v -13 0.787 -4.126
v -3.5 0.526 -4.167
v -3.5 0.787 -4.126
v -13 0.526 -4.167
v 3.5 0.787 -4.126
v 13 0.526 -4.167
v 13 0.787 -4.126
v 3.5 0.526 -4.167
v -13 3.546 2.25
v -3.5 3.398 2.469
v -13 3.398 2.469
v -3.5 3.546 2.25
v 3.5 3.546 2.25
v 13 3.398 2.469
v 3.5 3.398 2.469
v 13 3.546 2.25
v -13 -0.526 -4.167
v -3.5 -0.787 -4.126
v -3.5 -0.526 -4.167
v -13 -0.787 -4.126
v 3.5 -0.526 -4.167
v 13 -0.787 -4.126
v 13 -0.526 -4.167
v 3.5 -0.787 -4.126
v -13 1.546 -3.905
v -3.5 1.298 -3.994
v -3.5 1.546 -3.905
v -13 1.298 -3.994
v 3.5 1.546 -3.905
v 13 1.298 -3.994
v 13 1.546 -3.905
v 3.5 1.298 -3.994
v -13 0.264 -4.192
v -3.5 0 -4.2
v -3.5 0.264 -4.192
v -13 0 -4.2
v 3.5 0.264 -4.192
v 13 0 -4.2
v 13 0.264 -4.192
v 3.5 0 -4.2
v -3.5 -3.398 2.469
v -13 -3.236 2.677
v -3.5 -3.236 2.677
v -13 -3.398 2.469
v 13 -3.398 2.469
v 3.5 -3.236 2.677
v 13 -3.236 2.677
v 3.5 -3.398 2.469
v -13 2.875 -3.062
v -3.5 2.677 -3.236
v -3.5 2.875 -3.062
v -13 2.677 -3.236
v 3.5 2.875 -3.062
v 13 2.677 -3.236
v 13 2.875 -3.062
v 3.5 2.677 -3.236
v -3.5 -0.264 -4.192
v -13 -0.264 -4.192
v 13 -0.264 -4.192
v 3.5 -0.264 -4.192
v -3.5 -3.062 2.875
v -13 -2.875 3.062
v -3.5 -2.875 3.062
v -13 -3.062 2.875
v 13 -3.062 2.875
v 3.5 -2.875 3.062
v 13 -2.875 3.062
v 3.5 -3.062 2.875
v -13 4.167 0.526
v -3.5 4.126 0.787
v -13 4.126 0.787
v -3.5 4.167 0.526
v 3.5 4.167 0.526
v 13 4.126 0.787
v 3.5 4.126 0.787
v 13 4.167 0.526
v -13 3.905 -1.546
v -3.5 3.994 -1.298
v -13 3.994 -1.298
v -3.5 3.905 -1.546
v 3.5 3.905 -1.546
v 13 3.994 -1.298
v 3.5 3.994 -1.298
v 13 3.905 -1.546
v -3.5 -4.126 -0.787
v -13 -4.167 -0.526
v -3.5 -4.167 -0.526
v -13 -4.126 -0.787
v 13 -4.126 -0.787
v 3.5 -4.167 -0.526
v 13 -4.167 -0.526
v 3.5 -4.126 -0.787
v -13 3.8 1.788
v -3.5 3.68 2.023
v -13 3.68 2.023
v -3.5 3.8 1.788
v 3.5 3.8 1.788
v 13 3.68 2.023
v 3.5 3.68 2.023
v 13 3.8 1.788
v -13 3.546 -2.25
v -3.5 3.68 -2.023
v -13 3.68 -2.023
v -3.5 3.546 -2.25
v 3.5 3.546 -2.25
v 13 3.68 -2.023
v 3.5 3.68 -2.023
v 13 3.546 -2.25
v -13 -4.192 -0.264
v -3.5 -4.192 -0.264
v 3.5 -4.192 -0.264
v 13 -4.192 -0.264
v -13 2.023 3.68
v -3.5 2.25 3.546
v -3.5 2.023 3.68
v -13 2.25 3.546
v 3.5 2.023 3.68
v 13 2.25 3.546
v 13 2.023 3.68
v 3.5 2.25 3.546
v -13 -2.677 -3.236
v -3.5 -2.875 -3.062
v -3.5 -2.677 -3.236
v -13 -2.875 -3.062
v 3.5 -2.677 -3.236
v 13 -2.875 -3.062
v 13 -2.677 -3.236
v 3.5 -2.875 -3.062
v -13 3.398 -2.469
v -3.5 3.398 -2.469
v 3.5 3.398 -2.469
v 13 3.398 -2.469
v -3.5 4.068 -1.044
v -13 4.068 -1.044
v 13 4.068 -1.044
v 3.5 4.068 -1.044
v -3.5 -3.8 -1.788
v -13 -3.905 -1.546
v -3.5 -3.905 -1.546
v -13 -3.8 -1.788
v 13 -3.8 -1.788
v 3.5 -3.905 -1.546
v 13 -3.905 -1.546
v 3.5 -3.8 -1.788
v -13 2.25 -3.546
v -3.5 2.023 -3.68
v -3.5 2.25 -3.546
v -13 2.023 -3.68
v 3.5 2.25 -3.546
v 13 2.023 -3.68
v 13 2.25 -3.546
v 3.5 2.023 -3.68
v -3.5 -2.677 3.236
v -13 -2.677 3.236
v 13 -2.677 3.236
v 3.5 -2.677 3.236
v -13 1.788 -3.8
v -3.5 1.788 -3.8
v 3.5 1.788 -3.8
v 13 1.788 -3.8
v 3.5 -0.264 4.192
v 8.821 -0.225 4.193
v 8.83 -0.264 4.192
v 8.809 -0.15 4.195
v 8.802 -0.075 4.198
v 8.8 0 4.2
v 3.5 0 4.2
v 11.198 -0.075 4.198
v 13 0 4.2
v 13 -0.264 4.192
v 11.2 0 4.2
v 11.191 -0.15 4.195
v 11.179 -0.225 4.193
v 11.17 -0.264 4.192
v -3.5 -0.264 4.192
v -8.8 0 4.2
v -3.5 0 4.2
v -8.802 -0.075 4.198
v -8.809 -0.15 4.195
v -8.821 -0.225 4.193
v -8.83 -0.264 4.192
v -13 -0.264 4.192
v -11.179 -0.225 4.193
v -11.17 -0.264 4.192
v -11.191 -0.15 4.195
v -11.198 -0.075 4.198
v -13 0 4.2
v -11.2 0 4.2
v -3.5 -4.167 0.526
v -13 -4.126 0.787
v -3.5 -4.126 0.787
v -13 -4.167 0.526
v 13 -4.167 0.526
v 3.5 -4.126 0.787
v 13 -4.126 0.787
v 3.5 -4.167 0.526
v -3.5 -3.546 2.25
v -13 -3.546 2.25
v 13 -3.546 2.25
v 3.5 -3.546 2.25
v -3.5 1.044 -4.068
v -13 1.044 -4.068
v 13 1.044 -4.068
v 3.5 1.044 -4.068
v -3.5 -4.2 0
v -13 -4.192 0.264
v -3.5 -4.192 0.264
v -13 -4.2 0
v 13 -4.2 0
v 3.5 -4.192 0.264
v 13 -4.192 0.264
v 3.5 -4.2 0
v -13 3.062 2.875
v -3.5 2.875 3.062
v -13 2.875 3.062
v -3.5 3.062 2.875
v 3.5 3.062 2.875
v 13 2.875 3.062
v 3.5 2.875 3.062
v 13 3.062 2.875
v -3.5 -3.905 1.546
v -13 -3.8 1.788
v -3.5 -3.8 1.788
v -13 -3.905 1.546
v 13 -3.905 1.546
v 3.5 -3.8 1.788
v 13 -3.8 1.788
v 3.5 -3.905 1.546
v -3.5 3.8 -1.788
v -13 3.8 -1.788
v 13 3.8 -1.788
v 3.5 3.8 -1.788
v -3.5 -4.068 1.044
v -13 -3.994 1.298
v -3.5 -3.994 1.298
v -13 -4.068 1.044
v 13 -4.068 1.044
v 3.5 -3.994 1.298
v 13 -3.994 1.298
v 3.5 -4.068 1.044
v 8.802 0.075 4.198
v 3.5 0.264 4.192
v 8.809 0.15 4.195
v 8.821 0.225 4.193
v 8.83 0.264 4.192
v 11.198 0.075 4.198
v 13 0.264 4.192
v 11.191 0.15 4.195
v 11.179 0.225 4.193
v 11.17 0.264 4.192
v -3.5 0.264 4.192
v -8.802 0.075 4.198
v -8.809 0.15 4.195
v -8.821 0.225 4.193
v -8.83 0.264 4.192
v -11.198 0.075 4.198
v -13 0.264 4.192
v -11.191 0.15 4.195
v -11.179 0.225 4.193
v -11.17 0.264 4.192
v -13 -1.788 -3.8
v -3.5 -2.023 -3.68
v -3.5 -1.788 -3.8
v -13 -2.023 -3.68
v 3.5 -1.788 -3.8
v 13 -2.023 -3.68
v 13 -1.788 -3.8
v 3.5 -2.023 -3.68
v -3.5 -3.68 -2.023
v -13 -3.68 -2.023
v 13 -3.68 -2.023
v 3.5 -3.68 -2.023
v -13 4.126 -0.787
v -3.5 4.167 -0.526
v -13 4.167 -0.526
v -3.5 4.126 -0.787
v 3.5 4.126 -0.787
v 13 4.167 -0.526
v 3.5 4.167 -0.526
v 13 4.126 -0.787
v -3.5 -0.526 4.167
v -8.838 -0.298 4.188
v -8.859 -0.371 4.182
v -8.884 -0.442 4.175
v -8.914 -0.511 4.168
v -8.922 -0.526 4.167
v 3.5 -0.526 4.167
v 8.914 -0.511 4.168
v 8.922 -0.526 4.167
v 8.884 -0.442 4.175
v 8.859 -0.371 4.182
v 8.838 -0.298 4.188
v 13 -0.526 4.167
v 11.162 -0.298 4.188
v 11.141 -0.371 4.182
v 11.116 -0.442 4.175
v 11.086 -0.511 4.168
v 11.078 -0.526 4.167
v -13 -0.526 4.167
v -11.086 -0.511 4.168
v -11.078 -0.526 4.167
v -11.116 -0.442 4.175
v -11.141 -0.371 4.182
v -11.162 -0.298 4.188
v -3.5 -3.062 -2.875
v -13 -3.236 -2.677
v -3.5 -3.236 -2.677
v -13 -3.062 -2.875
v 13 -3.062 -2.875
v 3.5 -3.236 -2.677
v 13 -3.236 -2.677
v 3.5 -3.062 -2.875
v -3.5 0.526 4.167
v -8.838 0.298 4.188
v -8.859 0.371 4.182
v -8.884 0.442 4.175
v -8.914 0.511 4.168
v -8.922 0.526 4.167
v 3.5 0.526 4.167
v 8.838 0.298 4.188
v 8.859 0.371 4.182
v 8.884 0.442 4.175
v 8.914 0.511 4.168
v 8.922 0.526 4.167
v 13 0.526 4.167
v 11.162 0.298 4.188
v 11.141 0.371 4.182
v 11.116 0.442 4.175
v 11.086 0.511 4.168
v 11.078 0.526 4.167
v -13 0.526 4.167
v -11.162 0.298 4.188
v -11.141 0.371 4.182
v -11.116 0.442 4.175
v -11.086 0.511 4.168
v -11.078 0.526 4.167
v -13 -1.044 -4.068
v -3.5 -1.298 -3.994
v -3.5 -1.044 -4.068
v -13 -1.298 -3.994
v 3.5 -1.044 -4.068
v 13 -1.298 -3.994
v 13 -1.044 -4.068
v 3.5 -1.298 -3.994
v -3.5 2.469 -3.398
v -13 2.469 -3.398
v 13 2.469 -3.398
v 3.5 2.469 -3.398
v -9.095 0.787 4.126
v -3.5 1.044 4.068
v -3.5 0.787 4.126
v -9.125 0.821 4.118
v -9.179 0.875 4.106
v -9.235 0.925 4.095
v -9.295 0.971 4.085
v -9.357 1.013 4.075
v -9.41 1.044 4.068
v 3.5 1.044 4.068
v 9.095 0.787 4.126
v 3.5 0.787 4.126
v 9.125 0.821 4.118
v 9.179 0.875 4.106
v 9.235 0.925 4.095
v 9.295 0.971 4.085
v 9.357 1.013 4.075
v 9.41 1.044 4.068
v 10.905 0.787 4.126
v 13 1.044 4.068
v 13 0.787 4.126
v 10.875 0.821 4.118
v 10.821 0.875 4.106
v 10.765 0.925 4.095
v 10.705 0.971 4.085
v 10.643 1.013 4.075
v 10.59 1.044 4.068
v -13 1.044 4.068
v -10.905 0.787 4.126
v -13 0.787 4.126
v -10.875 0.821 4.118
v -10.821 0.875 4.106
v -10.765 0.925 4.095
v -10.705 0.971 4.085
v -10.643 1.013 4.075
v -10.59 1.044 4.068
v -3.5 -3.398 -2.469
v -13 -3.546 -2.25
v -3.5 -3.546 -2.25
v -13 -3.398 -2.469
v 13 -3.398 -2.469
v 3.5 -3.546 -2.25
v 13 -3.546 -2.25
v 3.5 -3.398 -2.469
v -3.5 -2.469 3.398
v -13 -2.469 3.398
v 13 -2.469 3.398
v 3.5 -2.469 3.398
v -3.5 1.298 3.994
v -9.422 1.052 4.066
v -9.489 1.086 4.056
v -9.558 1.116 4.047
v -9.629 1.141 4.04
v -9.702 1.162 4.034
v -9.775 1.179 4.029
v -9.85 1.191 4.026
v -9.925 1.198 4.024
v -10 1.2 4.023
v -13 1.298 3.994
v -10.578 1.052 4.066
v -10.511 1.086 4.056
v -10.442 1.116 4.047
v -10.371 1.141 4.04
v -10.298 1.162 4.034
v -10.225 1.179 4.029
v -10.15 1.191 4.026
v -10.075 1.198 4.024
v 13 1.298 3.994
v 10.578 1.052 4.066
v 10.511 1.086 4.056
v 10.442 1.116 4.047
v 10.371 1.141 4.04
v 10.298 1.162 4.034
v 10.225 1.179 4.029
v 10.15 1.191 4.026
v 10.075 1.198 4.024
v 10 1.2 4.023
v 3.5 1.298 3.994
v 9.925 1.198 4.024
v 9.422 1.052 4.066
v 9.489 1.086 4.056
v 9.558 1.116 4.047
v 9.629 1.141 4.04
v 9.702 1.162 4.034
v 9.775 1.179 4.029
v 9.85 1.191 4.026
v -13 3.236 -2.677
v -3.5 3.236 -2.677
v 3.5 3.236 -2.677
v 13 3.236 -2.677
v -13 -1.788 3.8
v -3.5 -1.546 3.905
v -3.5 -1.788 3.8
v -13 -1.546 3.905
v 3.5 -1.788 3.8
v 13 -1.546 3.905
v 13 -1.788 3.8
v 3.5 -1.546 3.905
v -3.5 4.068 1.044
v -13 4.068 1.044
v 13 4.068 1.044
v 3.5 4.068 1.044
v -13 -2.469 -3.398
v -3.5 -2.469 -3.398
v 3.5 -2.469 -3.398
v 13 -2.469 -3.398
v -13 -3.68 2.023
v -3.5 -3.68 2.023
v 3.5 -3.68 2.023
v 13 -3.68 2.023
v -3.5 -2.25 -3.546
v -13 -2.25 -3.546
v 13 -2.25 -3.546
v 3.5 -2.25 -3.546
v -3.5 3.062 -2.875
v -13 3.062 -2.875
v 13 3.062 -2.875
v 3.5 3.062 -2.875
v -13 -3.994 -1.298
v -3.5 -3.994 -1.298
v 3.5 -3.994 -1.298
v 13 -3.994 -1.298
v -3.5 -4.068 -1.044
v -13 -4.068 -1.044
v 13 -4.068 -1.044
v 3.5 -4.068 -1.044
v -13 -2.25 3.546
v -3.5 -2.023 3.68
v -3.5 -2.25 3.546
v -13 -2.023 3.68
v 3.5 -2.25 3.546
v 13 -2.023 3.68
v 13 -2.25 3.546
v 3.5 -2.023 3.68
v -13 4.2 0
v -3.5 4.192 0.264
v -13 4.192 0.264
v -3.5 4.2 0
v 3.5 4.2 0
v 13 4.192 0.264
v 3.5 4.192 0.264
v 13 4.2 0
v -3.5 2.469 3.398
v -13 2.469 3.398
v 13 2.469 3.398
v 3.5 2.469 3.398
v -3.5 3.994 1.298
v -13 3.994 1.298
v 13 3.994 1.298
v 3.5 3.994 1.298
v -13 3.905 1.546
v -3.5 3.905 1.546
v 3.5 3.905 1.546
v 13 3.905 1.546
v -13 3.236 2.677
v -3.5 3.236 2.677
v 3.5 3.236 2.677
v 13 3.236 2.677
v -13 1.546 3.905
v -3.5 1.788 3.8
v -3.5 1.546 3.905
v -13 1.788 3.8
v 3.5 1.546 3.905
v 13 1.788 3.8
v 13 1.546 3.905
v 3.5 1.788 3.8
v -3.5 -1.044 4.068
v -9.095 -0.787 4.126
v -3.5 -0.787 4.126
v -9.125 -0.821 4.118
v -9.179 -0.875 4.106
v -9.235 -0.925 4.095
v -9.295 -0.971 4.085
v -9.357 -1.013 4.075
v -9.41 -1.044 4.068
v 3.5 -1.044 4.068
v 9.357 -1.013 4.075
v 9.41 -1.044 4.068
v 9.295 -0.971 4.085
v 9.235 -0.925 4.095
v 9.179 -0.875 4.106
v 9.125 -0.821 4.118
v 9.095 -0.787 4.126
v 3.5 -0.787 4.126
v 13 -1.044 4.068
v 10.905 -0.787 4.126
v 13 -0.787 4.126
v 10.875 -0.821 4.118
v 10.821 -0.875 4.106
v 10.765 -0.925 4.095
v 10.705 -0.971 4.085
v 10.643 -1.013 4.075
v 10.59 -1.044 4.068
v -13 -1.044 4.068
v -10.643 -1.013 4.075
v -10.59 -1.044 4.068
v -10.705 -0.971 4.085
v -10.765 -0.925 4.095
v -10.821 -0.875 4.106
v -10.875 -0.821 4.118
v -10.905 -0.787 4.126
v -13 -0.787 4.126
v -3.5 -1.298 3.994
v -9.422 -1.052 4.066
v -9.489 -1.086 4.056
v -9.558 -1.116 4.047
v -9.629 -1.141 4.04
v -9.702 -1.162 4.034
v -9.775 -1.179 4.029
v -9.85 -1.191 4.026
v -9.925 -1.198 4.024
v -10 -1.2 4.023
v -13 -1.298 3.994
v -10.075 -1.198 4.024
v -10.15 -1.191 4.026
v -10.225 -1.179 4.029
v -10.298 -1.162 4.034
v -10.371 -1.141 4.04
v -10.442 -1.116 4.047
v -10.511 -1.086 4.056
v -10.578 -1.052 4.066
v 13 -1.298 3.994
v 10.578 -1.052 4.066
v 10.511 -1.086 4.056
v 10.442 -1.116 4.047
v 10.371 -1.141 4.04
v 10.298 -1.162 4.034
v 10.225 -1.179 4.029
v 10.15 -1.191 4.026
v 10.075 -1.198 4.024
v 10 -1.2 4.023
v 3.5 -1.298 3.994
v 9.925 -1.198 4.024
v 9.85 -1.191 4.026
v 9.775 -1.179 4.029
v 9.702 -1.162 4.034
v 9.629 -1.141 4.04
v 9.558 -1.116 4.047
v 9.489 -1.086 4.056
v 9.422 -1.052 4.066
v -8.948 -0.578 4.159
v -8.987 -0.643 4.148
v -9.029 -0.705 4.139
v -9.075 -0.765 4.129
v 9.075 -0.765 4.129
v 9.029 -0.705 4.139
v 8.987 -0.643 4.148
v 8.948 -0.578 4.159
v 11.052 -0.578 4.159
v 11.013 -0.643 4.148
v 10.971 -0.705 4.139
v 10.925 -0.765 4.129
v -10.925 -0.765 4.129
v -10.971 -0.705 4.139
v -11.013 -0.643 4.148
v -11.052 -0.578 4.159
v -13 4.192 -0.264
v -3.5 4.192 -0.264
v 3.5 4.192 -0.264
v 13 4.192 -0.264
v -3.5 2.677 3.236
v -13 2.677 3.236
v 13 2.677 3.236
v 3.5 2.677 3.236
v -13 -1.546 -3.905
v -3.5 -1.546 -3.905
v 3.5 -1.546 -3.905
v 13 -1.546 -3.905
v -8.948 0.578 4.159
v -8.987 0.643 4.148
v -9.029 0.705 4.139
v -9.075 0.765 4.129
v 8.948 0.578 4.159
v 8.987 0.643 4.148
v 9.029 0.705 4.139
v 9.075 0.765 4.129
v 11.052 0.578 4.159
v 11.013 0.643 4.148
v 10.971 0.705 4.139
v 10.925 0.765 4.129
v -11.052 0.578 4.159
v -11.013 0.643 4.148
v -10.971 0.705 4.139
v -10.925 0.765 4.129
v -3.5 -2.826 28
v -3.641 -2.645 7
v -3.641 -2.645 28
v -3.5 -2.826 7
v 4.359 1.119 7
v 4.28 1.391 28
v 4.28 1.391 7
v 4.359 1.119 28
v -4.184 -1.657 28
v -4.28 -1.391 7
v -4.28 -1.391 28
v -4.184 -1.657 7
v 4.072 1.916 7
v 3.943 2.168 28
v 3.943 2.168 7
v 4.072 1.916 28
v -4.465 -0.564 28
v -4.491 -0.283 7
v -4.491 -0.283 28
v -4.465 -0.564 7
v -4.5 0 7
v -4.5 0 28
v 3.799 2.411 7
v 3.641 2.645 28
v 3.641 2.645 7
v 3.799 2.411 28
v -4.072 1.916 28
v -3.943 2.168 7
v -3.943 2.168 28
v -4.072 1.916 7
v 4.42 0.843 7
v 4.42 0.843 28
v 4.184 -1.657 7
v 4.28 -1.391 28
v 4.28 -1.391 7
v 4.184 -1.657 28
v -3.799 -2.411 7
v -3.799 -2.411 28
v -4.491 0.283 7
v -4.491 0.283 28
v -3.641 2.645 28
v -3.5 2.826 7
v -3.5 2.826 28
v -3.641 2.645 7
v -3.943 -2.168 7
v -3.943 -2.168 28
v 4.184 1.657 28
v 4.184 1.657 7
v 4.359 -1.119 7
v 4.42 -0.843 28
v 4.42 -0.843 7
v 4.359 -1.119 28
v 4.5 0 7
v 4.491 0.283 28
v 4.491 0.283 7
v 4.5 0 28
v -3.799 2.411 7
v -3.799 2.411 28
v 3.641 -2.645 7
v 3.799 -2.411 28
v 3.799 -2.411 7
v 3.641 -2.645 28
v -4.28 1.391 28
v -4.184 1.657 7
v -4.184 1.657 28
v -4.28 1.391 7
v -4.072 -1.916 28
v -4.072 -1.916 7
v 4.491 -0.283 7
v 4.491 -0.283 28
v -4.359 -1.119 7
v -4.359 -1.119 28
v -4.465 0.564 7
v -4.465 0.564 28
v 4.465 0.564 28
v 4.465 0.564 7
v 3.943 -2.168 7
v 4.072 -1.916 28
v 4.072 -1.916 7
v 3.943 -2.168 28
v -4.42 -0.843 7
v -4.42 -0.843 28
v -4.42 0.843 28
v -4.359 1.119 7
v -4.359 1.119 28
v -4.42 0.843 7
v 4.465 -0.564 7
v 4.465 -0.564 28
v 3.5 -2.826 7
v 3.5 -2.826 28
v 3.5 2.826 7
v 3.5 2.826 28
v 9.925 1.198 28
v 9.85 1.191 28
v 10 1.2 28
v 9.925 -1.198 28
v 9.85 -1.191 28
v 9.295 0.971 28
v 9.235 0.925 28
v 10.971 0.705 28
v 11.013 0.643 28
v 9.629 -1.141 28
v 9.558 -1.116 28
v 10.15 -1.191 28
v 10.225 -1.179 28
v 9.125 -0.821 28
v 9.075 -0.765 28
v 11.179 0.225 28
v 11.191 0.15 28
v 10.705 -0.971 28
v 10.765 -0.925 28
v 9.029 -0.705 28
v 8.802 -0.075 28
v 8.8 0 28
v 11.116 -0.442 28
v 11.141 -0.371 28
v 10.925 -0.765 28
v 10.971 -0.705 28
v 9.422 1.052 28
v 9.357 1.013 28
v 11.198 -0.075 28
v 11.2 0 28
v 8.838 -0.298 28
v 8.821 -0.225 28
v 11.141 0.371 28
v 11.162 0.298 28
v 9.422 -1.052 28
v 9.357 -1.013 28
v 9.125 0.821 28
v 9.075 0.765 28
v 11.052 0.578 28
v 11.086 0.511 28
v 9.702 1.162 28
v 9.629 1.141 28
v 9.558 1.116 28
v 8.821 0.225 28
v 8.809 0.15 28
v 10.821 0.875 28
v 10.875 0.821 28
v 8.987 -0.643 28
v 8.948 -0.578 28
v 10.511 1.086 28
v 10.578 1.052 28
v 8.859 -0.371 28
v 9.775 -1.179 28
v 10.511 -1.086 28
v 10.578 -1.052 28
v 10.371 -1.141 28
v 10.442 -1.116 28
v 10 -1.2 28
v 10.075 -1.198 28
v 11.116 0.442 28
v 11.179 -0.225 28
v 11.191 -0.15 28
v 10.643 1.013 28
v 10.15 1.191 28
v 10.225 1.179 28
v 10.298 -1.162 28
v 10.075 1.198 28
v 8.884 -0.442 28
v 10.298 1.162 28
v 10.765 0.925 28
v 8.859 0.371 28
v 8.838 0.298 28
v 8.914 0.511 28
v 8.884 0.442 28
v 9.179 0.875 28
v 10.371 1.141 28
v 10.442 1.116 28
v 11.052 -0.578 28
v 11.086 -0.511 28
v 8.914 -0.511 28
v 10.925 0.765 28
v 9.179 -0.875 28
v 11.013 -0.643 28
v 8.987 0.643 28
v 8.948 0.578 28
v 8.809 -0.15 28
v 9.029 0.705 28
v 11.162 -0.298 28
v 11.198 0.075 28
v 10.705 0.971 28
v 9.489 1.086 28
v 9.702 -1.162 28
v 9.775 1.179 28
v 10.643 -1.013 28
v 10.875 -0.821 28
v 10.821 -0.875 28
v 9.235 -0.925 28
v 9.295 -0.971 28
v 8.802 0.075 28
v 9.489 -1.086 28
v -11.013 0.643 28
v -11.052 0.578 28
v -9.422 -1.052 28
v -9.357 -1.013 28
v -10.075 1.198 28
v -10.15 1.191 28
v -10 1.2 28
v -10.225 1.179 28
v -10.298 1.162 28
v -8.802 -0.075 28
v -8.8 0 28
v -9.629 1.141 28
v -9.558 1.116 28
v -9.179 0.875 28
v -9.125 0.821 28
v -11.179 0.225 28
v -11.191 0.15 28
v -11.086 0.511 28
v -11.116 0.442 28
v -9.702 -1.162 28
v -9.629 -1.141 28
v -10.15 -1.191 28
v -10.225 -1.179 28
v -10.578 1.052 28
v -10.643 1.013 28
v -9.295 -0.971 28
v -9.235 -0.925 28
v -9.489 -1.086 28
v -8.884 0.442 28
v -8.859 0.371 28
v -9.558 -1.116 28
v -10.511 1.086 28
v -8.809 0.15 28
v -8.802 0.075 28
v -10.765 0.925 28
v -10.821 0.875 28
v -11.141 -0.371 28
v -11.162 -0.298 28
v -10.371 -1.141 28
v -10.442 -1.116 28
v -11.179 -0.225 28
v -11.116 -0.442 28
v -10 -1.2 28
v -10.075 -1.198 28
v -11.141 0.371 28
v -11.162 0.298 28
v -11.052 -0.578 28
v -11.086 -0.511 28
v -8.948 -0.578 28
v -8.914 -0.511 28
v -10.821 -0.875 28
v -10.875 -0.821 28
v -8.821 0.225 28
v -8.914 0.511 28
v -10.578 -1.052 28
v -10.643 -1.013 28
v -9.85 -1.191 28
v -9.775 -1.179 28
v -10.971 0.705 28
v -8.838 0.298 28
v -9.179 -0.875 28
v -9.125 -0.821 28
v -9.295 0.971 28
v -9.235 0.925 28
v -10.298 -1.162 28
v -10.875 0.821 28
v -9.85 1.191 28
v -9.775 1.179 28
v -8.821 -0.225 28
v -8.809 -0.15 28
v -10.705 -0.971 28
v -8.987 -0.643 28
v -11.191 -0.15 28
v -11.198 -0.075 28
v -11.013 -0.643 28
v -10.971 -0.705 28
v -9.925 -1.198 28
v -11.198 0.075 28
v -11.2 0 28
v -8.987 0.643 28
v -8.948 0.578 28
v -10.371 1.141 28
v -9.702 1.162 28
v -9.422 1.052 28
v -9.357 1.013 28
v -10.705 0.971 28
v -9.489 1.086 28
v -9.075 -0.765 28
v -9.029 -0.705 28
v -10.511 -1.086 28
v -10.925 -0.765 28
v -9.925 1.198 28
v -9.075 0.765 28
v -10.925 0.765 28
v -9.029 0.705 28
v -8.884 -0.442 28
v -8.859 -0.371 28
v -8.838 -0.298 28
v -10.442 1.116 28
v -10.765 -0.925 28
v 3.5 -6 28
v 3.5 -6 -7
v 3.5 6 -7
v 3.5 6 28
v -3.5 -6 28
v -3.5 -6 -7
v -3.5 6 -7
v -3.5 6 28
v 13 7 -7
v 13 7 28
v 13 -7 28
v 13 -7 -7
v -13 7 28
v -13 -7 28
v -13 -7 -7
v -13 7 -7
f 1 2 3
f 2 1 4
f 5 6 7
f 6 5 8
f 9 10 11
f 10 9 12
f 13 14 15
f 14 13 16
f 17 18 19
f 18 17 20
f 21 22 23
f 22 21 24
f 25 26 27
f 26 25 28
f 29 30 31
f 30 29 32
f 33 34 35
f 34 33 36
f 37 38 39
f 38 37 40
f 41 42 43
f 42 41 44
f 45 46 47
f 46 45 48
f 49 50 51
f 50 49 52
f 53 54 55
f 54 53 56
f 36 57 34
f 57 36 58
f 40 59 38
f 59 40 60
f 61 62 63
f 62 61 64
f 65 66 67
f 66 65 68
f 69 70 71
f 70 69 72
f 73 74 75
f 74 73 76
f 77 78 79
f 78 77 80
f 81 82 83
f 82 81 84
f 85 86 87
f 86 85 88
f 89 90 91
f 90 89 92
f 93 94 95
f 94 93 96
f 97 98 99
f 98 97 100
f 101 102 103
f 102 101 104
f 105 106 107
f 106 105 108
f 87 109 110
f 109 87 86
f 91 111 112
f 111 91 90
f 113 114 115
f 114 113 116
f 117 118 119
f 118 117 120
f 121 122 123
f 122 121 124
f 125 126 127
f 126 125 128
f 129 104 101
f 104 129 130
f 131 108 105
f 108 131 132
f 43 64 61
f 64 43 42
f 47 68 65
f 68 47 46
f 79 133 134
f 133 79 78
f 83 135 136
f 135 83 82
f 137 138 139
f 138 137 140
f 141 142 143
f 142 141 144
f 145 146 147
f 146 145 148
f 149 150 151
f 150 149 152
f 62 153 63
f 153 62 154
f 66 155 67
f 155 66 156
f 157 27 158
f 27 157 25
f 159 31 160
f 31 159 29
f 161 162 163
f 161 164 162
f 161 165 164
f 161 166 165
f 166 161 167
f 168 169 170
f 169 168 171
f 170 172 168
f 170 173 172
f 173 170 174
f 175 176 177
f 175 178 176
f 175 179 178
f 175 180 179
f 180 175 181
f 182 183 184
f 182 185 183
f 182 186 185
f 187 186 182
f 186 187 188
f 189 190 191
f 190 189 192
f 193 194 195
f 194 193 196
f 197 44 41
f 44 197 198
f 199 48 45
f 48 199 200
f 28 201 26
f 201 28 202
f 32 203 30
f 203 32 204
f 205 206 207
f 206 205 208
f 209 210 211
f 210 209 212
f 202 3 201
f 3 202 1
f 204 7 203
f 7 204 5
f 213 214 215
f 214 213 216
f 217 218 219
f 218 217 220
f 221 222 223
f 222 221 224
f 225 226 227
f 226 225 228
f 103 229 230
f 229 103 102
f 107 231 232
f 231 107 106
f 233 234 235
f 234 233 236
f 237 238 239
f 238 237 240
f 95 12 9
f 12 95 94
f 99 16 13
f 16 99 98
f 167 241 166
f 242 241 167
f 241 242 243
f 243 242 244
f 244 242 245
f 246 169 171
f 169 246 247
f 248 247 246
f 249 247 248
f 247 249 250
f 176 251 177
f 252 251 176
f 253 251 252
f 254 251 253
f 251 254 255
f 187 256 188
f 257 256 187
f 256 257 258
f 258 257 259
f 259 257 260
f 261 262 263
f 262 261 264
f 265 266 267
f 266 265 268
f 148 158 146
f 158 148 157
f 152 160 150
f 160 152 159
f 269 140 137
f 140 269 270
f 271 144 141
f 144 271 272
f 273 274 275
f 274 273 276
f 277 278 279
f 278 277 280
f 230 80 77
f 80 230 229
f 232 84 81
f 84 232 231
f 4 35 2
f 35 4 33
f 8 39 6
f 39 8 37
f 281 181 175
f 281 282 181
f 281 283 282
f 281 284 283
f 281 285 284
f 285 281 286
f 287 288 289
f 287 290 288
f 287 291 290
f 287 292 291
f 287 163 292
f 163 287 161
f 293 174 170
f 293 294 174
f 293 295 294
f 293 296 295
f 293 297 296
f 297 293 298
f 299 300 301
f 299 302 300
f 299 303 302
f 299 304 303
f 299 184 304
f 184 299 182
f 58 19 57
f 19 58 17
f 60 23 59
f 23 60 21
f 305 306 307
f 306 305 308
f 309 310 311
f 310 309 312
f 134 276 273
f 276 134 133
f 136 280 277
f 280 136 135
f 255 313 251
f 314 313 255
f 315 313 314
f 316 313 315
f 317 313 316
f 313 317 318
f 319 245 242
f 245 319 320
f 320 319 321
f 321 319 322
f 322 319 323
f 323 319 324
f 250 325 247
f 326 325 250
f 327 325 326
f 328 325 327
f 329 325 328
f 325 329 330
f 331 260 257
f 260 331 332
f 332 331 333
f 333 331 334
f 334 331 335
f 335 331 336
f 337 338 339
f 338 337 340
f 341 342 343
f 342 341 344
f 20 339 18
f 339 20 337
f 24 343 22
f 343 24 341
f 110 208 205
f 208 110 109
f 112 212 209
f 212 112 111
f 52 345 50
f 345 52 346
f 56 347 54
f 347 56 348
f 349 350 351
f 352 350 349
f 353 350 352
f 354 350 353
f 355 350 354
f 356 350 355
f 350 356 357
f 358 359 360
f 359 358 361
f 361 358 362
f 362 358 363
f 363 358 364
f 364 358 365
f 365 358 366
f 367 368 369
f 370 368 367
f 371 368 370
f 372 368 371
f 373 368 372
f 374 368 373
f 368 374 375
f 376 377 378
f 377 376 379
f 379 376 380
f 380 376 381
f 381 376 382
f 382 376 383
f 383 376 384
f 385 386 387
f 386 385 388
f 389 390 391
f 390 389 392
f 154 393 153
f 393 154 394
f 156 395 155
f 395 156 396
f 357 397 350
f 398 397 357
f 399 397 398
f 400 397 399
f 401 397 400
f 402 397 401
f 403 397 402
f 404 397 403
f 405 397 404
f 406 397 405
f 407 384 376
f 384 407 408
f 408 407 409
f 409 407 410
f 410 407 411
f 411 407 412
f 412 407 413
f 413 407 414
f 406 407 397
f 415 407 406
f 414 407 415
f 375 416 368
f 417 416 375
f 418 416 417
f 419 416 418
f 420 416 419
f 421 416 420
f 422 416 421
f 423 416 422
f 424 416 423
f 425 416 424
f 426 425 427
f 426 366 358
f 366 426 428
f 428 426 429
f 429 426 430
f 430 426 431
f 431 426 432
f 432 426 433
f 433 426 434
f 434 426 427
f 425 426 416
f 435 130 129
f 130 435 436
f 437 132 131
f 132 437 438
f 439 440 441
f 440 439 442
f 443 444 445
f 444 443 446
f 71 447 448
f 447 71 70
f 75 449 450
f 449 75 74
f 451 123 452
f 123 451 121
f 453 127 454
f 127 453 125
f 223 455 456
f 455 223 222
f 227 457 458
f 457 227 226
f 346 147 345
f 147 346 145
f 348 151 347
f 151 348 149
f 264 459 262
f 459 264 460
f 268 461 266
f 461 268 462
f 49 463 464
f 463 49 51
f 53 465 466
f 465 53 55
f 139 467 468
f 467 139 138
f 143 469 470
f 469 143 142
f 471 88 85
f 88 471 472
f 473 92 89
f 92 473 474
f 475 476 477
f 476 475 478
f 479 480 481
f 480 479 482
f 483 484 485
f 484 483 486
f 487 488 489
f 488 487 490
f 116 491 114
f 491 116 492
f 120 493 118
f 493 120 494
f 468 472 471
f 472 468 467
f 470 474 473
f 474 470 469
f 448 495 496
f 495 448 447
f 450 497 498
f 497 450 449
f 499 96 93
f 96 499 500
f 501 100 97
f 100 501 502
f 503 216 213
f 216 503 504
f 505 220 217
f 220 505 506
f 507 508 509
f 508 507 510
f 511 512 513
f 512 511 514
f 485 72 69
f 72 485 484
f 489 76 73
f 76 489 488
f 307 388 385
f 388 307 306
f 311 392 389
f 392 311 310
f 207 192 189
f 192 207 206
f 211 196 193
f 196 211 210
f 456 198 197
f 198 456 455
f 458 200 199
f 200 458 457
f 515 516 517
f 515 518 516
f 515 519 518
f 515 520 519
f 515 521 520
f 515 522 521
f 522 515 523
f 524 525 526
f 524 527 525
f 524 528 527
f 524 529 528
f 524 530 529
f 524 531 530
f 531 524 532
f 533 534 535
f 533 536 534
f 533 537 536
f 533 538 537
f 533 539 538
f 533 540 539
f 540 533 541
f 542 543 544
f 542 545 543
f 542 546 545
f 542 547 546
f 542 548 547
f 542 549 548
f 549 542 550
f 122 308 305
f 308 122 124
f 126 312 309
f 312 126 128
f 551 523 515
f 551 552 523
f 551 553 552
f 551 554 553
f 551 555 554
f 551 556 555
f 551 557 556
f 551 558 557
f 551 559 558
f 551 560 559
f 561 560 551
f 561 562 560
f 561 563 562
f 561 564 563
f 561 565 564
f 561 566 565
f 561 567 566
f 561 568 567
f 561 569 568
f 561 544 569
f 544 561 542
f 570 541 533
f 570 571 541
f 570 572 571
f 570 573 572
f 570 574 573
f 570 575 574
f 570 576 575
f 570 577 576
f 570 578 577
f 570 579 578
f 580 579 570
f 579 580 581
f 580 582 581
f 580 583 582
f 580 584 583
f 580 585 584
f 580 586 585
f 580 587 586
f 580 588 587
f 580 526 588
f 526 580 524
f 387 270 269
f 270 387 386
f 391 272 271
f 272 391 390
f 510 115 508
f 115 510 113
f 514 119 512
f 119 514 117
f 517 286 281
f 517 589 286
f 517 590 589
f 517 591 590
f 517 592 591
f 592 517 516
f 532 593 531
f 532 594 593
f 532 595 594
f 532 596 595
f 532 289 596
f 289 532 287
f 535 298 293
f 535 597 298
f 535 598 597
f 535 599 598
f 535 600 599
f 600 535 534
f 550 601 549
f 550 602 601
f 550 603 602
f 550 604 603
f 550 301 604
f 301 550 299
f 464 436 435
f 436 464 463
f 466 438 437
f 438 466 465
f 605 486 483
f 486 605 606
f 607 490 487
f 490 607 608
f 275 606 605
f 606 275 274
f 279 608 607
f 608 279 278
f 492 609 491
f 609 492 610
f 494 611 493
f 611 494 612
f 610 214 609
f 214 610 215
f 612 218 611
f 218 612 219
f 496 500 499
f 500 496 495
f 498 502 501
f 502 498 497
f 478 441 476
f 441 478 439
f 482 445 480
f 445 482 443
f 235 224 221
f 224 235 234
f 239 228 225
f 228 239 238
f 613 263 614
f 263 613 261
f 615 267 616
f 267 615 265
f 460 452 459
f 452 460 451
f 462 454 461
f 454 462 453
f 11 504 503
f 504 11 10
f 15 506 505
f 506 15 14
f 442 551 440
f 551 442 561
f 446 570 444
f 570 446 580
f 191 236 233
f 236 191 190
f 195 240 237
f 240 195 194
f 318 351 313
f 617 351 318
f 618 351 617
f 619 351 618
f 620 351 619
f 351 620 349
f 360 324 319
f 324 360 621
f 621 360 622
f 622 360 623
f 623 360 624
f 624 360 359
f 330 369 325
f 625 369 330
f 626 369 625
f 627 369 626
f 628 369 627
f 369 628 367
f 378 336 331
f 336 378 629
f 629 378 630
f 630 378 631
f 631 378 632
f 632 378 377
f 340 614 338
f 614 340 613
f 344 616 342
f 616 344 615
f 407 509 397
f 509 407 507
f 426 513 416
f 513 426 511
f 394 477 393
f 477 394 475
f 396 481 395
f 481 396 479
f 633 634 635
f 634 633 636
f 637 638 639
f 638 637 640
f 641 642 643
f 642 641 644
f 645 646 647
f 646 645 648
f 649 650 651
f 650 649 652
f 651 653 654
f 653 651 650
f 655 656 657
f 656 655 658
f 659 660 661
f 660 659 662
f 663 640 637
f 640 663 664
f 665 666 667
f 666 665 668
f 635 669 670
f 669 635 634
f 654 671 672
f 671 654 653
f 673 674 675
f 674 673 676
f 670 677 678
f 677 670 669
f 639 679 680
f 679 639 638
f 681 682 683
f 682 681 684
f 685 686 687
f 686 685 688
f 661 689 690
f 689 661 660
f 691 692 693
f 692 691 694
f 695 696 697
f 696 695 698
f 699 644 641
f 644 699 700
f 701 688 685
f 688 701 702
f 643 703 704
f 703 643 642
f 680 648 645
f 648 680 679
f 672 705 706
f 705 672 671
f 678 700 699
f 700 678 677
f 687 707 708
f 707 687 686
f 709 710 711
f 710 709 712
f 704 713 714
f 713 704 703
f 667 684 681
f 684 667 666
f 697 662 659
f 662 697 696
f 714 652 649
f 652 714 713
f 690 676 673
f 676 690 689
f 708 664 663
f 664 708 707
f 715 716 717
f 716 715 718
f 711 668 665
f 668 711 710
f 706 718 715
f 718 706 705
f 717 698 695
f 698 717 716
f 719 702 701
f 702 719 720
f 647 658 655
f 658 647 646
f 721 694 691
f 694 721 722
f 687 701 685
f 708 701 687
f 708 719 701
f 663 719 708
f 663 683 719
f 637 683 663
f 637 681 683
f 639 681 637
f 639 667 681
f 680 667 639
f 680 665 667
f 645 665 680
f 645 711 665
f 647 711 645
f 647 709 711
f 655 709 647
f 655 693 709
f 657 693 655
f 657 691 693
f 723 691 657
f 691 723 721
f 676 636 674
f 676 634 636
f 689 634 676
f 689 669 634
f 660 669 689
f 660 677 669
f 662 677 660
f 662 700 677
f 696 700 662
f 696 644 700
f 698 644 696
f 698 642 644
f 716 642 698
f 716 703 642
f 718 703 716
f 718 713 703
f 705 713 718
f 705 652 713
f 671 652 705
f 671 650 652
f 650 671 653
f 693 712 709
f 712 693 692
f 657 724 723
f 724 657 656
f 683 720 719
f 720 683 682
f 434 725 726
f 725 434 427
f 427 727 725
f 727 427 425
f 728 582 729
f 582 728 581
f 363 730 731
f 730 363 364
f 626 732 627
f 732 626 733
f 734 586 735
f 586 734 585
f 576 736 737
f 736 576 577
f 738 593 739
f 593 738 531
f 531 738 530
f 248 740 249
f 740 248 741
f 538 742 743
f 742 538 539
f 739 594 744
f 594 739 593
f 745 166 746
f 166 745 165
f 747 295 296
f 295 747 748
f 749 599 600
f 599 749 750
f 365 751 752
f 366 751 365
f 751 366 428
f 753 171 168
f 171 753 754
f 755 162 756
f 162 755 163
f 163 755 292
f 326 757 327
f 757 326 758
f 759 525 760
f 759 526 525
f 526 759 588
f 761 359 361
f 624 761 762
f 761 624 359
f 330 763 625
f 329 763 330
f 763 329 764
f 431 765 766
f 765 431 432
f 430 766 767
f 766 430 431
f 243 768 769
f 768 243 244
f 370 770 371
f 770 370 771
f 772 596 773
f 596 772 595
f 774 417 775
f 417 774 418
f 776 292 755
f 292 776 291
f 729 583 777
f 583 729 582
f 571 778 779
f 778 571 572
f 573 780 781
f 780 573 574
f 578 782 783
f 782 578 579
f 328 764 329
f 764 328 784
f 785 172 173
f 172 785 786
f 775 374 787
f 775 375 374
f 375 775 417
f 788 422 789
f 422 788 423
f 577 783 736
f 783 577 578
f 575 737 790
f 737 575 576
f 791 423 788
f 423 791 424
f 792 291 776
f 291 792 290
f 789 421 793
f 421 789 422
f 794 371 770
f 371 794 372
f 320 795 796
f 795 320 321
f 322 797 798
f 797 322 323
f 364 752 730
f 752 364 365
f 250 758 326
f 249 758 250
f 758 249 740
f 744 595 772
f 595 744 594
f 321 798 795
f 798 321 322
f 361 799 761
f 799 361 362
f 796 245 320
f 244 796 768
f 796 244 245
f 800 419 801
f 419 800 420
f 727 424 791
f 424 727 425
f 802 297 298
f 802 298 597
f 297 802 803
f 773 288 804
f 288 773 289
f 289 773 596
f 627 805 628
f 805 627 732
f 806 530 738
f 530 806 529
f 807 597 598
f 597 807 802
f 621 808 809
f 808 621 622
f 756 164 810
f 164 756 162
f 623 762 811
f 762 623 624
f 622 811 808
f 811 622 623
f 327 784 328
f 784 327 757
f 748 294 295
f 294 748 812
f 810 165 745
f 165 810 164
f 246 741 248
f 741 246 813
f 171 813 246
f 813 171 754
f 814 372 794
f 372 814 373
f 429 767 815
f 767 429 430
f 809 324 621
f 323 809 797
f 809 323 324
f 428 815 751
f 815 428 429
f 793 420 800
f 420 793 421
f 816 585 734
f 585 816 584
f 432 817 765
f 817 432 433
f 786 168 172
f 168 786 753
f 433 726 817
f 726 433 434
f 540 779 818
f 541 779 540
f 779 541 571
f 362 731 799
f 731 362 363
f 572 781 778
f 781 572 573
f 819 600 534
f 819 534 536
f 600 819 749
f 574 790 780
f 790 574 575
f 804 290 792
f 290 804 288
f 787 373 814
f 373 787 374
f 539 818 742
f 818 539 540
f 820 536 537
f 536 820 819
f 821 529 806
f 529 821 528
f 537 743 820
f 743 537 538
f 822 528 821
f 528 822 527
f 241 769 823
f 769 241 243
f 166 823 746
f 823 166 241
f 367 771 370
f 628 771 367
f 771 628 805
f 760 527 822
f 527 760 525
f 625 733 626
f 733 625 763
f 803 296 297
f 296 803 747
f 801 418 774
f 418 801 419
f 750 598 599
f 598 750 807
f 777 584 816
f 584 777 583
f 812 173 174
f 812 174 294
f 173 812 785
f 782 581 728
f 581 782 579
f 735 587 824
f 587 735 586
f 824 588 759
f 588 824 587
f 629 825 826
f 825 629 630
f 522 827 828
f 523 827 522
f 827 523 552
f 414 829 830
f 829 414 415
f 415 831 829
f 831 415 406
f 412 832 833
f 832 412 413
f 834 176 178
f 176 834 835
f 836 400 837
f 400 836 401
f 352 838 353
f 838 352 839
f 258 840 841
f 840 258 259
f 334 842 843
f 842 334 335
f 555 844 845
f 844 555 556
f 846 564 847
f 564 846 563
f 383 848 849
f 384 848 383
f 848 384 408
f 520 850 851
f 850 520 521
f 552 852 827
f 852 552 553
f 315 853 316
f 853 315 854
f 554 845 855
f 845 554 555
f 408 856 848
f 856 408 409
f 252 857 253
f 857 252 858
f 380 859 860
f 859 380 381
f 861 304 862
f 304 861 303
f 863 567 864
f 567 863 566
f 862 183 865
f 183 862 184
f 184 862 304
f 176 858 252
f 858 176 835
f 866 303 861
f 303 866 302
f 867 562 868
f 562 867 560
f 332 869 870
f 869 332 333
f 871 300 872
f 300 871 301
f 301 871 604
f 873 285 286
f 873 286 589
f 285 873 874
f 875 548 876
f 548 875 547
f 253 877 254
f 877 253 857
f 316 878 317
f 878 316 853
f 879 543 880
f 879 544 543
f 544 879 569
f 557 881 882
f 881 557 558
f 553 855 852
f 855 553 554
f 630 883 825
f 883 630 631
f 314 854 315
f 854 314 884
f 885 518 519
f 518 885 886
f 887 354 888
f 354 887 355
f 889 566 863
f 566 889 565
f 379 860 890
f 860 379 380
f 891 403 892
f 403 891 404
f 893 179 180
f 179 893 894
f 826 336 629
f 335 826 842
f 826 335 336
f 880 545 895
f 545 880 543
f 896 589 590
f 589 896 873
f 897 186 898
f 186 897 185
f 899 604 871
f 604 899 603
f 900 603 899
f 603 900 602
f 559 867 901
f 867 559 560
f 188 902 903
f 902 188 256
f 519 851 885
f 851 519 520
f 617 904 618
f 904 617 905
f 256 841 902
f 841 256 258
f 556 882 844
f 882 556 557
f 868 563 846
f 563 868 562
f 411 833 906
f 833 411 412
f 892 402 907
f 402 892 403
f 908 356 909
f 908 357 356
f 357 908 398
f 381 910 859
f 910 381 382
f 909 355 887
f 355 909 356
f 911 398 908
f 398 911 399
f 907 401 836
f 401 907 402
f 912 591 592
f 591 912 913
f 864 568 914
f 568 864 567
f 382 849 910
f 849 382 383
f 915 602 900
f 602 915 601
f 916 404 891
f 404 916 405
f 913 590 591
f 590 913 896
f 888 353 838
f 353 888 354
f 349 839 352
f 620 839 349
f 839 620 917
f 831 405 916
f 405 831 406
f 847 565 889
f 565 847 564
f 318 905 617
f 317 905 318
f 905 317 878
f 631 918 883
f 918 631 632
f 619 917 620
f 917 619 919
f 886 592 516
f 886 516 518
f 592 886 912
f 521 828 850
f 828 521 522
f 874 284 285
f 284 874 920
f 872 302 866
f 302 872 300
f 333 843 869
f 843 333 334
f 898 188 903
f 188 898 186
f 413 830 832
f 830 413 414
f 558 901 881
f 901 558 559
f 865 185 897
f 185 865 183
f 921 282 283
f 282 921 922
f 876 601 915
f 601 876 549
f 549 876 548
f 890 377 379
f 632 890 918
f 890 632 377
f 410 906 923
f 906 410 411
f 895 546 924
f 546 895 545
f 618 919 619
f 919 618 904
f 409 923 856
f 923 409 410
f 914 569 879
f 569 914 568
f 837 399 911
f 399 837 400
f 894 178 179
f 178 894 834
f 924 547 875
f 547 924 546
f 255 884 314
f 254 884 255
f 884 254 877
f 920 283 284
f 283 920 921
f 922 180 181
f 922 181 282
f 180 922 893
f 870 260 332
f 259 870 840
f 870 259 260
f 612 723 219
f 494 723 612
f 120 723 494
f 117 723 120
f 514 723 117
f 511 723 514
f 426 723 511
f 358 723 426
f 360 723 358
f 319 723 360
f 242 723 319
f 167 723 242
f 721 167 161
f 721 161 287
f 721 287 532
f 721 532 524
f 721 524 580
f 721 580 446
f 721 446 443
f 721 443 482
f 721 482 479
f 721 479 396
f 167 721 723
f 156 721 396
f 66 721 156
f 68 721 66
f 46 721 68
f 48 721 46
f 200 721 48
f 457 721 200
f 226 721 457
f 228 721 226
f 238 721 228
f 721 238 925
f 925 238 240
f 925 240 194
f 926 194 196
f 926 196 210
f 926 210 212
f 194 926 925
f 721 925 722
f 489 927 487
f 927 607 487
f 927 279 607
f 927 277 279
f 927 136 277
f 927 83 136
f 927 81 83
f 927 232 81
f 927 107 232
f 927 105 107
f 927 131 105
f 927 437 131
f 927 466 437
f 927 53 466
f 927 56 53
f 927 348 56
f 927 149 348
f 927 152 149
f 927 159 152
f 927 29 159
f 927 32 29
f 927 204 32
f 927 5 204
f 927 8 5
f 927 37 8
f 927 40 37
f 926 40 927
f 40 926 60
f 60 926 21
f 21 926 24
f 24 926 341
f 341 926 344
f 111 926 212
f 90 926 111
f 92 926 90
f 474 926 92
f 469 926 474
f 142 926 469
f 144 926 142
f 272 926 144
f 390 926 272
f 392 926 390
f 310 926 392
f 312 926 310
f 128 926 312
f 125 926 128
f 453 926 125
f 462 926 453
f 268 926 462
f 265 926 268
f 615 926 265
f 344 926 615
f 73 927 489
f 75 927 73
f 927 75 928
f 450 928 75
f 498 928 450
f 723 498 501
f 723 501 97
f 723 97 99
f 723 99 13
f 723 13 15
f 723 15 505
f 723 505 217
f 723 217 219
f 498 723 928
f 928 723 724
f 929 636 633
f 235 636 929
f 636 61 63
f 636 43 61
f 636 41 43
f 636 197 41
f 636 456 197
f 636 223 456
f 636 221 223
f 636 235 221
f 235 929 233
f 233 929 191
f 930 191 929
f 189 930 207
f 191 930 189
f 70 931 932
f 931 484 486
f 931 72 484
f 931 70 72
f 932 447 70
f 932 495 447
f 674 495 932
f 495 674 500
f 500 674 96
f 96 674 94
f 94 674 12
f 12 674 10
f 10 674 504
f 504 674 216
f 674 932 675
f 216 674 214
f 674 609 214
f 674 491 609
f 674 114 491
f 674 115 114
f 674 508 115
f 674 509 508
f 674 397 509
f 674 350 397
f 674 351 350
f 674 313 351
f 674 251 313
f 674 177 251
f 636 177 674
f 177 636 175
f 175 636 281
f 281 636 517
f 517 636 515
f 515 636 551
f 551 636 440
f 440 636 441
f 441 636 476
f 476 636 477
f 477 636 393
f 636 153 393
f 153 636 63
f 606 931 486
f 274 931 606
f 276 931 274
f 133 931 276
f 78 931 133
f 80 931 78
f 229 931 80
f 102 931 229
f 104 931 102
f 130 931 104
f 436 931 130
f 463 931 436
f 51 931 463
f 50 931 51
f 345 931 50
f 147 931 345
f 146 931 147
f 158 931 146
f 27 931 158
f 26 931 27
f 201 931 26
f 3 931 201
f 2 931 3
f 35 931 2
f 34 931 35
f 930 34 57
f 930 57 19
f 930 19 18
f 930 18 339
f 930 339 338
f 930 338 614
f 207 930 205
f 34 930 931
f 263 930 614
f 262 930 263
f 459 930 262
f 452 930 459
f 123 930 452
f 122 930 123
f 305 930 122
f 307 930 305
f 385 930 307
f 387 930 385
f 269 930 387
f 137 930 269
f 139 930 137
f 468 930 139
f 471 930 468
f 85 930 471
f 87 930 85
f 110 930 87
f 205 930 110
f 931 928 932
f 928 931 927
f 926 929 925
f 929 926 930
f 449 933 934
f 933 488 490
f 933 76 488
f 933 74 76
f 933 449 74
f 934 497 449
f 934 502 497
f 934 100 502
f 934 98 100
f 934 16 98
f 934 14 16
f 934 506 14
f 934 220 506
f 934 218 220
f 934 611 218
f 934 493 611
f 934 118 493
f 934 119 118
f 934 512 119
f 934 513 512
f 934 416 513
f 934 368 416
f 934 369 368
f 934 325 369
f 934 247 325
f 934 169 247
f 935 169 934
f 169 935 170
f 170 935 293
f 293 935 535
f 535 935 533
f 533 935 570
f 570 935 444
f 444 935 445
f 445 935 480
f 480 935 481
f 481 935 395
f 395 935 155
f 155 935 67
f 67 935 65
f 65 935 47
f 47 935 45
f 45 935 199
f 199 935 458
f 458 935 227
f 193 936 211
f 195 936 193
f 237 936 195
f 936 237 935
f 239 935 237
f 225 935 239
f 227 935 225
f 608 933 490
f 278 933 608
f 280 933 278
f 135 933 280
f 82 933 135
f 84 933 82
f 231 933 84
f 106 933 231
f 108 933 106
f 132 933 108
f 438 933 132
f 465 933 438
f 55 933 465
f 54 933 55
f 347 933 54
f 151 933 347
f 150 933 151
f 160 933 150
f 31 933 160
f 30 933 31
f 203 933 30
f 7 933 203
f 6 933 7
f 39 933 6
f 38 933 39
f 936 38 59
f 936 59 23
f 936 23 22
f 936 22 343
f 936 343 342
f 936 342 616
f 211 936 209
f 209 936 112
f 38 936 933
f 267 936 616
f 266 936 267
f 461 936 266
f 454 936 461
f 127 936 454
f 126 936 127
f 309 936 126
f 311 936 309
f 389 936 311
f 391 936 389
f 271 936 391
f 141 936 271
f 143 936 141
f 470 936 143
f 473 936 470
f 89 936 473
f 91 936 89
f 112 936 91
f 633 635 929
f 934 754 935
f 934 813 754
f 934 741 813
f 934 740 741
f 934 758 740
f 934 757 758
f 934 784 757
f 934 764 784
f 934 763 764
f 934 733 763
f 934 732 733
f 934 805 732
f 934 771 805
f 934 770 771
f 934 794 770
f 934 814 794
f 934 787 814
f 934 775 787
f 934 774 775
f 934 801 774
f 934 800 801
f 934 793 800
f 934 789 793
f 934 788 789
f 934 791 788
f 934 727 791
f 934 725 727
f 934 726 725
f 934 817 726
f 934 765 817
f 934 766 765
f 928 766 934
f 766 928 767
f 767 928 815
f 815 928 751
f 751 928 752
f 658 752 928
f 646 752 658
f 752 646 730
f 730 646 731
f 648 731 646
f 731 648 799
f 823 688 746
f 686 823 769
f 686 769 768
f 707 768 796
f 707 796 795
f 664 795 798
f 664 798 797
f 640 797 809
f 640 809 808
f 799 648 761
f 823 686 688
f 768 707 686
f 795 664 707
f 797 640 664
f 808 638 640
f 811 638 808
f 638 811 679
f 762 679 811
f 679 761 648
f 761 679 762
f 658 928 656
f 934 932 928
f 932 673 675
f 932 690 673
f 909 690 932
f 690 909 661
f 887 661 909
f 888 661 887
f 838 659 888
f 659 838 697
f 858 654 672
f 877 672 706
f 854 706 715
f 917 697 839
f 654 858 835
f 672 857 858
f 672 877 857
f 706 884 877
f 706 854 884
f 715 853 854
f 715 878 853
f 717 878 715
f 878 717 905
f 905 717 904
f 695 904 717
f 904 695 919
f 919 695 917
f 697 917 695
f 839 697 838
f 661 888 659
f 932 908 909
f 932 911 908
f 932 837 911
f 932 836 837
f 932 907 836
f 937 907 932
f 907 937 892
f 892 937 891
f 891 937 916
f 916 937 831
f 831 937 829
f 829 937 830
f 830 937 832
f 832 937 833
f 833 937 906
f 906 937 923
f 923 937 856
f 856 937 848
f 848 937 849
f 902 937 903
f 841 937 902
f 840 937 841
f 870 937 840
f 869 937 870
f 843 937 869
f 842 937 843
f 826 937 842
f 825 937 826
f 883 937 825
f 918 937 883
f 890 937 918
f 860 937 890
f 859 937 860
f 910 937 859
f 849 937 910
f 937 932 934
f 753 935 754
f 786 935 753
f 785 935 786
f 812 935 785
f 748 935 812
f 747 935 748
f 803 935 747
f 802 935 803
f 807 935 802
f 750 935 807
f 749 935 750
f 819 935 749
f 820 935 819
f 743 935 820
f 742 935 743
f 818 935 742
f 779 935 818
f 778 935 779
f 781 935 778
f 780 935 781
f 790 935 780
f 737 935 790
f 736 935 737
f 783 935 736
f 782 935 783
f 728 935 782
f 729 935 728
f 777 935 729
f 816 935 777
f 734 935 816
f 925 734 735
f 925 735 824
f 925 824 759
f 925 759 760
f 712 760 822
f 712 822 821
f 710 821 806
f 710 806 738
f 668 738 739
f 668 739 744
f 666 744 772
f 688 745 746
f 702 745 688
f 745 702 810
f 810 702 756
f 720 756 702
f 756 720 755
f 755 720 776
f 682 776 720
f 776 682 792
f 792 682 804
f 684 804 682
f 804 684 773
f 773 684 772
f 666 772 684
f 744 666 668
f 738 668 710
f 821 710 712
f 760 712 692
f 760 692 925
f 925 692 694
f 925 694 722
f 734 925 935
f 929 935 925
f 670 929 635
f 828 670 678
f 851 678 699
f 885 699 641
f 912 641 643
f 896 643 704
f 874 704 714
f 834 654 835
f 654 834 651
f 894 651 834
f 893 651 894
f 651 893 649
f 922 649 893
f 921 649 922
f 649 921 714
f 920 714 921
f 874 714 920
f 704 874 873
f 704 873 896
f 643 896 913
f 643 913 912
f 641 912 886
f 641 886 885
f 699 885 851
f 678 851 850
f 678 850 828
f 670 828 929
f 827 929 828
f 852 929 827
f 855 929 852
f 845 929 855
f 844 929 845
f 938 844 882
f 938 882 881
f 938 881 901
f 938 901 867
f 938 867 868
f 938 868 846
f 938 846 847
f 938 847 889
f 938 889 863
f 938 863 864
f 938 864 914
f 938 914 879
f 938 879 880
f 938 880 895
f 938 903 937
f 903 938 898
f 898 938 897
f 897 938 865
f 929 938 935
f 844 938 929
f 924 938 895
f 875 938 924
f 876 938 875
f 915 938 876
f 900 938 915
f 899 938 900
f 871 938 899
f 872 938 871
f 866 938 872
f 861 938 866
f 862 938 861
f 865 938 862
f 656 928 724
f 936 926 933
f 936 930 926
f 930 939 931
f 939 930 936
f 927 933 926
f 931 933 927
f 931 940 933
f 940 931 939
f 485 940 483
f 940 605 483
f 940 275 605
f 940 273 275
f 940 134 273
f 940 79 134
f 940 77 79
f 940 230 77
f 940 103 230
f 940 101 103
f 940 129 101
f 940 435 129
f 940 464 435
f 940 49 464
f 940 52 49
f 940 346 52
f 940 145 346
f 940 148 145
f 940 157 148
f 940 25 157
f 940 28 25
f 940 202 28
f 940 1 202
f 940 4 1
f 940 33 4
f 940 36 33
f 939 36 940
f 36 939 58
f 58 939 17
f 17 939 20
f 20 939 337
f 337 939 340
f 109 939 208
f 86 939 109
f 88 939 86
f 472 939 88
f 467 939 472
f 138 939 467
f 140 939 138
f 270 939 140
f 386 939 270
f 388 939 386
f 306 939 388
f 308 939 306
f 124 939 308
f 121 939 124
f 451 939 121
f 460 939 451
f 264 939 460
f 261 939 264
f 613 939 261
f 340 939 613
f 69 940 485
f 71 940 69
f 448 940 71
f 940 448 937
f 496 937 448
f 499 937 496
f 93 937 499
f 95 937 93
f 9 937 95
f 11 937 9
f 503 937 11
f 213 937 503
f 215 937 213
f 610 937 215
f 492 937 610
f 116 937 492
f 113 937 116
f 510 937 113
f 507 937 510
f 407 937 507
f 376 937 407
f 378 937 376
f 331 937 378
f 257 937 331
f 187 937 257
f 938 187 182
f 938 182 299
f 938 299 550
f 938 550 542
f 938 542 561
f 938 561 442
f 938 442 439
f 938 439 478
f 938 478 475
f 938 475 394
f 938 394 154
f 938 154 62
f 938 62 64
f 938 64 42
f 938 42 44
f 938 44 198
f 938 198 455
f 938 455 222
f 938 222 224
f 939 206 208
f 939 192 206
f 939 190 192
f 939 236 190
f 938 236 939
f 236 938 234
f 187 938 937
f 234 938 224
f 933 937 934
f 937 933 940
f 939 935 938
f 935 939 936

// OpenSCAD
translate([0,-7,-7]){


        difference(){
            union(){

                translate([-13,0,0]){
                    cube([26,14,35], center=false);
                }      

            }
            union() {
                translate([-20,7,7]){
                    rotate([0,90,0]){
                        cylinder(h=100, r=4.2, $fn=100, center=false);
                    }
                }  


                translate([0,7,14]){
                    rotate([0,0,90]){
                        cylinder(h=33, r=4.5, $fn=100, center=false);
                    }
                }  

                translate([10,7,7]){
                    rotate([0,0,90]){
                        cylinder(h=33, r=1.2, $fn=100, center=false);
                    }
                }  
                translate([-10,7,7]){
                    rotate([0,0,90]){
                        cylinder(h=33, r=1.2, $fn=100, center=false);
                    }
                }  


                translate([-3.5,1,-1]){
                    cube([7,12,40], center=false);
                }


            }
        }
}
